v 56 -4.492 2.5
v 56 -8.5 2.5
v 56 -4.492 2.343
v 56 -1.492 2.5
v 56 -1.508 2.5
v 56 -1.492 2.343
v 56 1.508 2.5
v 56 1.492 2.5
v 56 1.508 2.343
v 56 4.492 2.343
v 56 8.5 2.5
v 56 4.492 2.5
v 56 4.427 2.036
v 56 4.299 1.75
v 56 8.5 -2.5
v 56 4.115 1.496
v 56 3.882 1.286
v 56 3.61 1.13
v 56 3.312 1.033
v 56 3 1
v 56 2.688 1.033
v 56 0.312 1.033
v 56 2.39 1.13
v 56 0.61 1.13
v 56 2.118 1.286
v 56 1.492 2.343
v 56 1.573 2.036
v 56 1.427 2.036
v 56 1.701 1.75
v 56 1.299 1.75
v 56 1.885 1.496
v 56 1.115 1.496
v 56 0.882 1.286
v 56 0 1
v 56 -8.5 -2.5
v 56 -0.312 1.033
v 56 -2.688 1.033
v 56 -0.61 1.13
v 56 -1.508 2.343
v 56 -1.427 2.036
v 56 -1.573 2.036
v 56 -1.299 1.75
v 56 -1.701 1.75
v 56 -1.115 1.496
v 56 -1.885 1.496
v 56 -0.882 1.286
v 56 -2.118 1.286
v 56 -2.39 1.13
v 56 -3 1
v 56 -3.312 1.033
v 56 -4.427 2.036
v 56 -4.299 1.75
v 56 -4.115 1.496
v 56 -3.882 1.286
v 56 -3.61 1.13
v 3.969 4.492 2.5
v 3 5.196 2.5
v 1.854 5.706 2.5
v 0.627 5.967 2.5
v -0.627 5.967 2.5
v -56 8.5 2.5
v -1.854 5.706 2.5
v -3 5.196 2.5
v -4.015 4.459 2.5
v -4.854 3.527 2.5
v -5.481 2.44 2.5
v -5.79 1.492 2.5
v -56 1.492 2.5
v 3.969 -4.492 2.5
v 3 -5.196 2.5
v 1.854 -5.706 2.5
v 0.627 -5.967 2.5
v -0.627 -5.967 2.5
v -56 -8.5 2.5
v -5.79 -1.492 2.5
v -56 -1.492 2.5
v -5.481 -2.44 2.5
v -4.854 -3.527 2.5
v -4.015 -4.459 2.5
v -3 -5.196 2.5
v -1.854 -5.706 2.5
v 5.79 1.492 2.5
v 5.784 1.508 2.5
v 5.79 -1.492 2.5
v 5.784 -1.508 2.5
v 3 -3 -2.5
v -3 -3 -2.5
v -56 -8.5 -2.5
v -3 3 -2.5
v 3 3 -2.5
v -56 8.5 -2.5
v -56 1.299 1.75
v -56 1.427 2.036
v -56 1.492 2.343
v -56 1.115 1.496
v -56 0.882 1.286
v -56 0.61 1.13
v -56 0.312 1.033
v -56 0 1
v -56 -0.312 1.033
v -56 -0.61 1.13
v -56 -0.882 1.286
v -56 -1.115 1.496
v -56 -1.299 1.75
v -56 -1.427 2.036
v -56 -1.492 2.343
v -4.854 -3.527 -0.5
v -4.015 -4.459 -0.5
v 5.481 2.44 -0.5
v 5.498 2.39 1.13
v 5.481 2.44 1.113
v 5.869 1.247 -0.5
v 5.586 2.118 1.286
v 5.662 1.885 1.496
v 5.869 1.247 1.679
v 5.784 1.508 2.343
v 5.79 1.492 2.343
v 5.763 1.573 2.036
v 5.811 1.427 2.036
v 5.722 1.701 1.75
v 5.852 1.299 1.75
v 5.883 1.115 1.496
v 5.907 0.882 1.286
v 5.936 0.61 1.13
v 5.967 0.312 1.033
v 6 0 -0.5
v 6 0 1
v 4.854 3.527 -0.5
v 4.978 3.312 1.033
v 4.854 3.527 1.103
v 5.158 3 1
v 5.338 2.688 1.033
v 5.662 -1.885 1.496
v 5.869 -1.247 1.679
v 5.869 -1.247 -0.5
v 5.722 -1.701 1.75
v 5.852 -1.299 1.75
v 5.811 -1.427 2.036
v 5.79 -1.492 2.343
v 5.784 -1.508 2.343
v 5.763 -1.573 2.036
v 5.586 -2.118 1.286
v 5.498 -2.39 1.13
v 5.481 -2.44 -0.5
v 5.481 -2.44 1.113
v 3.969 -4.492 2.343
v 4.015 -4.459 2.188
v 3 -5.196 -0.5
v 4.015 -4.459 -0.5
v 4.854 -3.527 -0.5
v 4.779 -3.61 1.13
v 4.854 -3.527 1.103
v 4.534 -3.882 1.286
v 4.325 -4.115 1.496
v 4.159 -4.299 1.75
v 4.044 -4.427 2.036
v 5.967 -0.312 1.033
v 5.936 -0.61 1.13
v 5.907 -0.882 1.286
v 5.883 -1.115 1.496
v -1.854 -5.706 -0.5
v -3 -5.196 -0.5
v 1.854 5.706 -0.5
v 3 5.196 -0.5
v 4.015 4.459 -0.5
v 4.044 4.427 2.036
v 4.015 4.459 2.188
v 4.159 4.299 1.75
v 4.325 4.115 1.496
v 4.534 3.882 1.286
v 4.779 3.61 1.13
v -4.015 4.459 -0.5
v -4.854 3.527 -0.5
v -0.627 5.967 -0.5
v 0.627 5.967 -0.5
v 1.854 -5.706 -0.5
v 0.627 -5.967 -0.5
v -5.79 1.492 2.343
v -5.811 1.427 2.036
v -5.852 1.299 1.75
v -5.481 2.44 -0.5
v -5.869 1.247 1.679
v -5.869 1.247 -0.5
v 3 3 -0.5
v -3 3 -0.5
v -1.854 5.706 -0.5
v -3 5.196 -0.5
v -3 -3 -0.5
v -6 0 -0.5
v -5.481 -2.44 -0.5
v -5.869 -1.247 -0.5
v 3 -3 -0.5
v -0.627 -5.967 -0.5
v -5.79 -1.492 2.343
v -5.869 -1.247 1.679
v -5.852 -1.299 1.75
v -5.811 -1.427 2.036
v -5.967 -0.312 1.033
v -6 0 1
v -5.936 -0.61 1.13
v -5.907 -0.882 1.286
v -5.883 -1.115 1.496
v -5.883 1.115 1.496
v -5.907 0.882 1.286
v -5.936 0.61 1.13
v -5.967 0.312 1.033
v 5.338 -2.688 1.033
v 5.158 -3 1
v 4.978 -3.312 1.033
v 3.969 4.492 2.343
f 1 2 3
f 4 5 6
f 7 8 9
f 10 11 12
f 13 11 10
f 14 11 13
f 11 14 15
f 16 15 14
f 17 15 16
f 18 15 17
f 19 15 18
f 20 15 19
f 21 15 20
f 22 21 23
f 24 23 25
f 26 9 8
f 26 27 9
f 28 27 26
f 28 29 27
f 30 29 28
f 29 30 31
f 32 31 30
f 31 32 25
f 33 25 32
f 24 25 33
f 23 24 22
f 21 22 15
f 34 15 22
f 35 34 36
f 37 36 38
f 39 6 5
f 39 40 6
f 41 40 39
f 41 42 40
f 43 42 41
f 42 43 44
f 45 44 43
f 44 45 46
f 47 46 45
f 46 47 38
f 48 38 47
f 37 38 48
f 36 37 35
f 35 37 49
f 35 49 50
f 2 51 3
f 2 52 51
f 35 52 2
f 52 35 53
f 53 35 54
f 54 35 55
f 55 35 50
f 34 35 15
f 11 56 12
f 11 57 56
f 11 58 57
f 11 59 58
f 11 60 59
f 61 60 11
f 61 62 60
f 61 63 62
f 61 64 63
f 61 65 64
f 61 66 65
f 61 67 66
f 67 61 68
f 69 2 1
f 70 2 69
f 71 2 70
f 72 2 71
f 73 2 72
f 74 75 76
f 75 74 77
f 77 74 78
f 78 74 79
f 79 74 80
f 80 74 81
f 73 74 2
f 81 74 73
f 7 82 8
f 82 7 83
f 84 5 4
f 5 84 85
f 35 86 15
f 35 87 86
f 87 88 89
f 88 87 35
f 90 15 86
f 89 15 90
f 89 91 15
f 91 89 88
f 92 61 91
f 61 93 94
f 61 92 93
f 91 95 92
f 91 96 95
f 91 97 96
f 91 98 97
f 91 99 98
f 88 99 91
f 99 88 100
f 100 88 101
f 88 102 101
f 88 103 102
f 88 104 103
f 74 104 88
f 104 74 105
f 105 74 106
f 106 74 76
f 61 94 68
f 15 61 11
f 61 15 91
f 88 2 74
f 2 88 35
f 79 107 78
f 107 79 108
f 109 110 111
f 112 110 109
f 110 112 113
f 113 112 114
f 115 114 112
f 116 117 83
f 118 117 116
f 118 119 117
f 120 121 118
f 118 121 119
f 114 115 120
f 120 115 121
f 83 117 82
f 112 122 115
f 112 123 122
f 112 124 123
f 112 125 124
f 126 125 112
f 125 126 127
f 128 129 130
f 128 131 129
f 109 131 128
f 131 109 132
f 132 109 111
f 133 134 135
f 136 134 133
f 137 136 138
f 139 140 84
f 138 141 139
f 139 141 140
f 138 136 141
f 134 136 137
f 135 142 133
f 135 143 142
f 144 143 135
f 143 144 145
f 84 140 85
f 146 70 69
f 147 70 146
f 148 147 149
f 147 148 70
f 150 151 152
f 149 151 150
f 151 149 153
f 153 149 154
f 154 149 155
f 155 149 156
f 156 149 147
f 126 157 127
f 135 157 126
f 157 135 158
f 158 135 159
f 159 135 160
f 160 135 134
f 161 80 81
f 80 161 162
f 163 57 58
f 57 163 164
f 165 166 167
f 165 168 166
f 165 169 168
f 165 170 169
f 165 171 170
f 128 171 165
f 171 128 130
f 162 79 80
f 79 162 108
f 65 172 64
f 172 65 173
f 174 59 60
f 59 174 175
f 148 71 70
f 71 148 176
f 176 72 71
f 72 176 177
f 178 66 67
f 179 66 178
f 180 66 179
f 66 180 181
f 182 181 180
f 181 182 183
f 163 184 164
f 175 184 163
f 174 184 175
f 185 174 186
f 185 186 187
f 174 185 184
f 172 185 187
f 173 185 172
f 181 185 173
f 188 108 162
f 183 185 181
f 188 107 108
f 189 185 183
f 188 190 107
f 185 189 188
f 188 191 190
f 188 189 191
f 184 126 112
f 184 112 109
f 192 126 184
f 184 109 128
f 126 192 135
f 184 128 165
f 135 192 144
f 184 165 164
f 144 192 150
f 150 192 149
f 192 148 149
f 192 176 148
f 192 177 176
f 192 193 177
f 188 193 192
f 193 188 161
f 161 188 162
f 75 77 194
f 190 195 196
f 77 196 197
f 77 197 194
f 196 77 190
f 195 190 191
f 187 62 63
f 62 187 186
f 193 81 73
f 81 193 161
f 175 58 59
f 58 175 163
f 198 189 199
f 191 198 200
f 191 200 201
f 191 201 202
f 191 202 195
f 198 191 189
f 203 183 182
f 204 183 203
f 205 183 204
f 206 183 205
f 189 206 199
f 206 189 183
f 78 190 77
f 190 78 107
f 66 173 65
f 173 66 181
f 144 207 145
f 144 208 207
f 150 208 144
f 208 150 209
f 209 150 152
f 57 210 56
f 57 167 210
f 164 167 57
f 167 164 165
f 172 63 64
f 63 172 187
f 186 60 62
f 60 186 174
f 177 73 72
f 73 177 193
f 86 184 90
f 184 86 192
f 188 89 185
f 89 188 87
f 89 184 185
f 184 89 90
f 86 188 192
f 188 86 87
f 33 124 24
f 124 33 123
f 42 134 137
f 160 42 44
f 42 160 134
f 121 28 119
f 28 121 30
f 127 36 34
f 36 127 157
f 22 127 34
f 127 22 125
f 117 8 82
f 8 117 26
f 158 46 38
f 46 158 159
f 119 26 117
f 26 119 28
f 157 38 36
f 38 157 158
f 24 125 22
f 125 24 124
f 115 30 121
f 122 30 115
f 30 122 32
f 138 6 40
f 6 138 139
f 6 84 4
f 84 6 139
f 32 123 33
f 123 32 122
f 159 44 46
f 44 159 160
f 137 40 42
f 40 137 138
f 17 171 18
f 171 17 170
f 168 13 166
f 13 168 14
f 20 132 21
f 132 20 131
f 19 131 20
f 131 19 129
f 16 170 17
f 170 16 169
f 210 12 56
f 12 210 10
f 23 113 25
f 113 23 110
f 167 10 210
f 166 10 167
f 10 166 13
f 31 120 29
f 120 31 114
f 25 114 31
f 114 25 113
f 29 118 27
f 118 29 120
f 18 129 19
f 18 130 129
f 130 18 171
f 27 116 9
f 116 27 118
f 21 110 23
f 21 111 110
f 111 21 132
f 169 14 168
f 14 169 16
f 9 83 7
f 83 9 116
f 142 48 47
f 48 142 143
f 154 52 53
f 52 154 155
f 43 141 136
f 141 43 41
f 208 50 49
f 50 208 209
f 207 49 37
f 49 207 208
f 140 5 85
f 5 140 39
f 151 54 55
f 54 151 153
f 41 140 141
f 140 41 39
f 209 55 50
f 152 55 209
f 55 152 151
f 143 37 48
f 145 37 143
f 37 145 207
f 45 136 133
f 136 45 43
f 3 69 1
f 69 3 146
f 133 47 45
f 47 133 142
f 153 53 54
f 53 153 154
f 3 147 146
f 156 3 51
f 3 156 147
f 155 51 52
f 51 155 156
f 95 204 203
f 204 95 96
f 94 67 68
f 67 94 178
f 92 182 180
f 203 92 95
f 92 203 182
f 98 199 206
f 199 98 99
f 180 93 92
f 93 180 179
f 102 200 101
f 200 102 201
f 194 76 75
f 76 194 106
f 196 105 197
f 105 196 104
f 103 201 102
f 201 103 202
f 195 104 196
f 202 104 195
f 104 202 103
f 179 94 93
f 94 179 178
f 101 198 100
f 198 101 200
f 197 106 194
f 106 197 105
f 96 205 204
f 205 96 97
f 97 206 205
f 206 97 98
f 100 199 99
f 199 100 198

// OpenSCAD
led_dia = 12;
wire_len = 50;
wire_dia = 3;
h= 5;

$fs=0.1;
difference() {
     cube([led_dia + 2 * wire_len, led_dia + 5, h], center=true);

     // Main body hole
     translate([0, 0, h/2-3])
          cylinder(d=led_dia, h=10);

     // Alignment with the LED itself
     cube([6, 6, 10], center=true);

     // Wire traces
     translate([0, 0, h/2])
          rotate([0, 90, 0])
          cylinder(d=wire_dia, h=wire_len + led_dia);
     translate([0, 3, h/2])
          rotate([0, 90, 0])
          cylinder(d=wire_dia, h=wire_len + led_dia);
     translate([0, -3, h/2])
          rotate([0, 90, 0])
          cylinder(d=wire_dia, h=wire_len + led_dia);

     translate([0, 0, h/2])
          rotate([0, -90, 0])
          cylinder(d=wire_dia, h=wire_len + led_dia);
}
